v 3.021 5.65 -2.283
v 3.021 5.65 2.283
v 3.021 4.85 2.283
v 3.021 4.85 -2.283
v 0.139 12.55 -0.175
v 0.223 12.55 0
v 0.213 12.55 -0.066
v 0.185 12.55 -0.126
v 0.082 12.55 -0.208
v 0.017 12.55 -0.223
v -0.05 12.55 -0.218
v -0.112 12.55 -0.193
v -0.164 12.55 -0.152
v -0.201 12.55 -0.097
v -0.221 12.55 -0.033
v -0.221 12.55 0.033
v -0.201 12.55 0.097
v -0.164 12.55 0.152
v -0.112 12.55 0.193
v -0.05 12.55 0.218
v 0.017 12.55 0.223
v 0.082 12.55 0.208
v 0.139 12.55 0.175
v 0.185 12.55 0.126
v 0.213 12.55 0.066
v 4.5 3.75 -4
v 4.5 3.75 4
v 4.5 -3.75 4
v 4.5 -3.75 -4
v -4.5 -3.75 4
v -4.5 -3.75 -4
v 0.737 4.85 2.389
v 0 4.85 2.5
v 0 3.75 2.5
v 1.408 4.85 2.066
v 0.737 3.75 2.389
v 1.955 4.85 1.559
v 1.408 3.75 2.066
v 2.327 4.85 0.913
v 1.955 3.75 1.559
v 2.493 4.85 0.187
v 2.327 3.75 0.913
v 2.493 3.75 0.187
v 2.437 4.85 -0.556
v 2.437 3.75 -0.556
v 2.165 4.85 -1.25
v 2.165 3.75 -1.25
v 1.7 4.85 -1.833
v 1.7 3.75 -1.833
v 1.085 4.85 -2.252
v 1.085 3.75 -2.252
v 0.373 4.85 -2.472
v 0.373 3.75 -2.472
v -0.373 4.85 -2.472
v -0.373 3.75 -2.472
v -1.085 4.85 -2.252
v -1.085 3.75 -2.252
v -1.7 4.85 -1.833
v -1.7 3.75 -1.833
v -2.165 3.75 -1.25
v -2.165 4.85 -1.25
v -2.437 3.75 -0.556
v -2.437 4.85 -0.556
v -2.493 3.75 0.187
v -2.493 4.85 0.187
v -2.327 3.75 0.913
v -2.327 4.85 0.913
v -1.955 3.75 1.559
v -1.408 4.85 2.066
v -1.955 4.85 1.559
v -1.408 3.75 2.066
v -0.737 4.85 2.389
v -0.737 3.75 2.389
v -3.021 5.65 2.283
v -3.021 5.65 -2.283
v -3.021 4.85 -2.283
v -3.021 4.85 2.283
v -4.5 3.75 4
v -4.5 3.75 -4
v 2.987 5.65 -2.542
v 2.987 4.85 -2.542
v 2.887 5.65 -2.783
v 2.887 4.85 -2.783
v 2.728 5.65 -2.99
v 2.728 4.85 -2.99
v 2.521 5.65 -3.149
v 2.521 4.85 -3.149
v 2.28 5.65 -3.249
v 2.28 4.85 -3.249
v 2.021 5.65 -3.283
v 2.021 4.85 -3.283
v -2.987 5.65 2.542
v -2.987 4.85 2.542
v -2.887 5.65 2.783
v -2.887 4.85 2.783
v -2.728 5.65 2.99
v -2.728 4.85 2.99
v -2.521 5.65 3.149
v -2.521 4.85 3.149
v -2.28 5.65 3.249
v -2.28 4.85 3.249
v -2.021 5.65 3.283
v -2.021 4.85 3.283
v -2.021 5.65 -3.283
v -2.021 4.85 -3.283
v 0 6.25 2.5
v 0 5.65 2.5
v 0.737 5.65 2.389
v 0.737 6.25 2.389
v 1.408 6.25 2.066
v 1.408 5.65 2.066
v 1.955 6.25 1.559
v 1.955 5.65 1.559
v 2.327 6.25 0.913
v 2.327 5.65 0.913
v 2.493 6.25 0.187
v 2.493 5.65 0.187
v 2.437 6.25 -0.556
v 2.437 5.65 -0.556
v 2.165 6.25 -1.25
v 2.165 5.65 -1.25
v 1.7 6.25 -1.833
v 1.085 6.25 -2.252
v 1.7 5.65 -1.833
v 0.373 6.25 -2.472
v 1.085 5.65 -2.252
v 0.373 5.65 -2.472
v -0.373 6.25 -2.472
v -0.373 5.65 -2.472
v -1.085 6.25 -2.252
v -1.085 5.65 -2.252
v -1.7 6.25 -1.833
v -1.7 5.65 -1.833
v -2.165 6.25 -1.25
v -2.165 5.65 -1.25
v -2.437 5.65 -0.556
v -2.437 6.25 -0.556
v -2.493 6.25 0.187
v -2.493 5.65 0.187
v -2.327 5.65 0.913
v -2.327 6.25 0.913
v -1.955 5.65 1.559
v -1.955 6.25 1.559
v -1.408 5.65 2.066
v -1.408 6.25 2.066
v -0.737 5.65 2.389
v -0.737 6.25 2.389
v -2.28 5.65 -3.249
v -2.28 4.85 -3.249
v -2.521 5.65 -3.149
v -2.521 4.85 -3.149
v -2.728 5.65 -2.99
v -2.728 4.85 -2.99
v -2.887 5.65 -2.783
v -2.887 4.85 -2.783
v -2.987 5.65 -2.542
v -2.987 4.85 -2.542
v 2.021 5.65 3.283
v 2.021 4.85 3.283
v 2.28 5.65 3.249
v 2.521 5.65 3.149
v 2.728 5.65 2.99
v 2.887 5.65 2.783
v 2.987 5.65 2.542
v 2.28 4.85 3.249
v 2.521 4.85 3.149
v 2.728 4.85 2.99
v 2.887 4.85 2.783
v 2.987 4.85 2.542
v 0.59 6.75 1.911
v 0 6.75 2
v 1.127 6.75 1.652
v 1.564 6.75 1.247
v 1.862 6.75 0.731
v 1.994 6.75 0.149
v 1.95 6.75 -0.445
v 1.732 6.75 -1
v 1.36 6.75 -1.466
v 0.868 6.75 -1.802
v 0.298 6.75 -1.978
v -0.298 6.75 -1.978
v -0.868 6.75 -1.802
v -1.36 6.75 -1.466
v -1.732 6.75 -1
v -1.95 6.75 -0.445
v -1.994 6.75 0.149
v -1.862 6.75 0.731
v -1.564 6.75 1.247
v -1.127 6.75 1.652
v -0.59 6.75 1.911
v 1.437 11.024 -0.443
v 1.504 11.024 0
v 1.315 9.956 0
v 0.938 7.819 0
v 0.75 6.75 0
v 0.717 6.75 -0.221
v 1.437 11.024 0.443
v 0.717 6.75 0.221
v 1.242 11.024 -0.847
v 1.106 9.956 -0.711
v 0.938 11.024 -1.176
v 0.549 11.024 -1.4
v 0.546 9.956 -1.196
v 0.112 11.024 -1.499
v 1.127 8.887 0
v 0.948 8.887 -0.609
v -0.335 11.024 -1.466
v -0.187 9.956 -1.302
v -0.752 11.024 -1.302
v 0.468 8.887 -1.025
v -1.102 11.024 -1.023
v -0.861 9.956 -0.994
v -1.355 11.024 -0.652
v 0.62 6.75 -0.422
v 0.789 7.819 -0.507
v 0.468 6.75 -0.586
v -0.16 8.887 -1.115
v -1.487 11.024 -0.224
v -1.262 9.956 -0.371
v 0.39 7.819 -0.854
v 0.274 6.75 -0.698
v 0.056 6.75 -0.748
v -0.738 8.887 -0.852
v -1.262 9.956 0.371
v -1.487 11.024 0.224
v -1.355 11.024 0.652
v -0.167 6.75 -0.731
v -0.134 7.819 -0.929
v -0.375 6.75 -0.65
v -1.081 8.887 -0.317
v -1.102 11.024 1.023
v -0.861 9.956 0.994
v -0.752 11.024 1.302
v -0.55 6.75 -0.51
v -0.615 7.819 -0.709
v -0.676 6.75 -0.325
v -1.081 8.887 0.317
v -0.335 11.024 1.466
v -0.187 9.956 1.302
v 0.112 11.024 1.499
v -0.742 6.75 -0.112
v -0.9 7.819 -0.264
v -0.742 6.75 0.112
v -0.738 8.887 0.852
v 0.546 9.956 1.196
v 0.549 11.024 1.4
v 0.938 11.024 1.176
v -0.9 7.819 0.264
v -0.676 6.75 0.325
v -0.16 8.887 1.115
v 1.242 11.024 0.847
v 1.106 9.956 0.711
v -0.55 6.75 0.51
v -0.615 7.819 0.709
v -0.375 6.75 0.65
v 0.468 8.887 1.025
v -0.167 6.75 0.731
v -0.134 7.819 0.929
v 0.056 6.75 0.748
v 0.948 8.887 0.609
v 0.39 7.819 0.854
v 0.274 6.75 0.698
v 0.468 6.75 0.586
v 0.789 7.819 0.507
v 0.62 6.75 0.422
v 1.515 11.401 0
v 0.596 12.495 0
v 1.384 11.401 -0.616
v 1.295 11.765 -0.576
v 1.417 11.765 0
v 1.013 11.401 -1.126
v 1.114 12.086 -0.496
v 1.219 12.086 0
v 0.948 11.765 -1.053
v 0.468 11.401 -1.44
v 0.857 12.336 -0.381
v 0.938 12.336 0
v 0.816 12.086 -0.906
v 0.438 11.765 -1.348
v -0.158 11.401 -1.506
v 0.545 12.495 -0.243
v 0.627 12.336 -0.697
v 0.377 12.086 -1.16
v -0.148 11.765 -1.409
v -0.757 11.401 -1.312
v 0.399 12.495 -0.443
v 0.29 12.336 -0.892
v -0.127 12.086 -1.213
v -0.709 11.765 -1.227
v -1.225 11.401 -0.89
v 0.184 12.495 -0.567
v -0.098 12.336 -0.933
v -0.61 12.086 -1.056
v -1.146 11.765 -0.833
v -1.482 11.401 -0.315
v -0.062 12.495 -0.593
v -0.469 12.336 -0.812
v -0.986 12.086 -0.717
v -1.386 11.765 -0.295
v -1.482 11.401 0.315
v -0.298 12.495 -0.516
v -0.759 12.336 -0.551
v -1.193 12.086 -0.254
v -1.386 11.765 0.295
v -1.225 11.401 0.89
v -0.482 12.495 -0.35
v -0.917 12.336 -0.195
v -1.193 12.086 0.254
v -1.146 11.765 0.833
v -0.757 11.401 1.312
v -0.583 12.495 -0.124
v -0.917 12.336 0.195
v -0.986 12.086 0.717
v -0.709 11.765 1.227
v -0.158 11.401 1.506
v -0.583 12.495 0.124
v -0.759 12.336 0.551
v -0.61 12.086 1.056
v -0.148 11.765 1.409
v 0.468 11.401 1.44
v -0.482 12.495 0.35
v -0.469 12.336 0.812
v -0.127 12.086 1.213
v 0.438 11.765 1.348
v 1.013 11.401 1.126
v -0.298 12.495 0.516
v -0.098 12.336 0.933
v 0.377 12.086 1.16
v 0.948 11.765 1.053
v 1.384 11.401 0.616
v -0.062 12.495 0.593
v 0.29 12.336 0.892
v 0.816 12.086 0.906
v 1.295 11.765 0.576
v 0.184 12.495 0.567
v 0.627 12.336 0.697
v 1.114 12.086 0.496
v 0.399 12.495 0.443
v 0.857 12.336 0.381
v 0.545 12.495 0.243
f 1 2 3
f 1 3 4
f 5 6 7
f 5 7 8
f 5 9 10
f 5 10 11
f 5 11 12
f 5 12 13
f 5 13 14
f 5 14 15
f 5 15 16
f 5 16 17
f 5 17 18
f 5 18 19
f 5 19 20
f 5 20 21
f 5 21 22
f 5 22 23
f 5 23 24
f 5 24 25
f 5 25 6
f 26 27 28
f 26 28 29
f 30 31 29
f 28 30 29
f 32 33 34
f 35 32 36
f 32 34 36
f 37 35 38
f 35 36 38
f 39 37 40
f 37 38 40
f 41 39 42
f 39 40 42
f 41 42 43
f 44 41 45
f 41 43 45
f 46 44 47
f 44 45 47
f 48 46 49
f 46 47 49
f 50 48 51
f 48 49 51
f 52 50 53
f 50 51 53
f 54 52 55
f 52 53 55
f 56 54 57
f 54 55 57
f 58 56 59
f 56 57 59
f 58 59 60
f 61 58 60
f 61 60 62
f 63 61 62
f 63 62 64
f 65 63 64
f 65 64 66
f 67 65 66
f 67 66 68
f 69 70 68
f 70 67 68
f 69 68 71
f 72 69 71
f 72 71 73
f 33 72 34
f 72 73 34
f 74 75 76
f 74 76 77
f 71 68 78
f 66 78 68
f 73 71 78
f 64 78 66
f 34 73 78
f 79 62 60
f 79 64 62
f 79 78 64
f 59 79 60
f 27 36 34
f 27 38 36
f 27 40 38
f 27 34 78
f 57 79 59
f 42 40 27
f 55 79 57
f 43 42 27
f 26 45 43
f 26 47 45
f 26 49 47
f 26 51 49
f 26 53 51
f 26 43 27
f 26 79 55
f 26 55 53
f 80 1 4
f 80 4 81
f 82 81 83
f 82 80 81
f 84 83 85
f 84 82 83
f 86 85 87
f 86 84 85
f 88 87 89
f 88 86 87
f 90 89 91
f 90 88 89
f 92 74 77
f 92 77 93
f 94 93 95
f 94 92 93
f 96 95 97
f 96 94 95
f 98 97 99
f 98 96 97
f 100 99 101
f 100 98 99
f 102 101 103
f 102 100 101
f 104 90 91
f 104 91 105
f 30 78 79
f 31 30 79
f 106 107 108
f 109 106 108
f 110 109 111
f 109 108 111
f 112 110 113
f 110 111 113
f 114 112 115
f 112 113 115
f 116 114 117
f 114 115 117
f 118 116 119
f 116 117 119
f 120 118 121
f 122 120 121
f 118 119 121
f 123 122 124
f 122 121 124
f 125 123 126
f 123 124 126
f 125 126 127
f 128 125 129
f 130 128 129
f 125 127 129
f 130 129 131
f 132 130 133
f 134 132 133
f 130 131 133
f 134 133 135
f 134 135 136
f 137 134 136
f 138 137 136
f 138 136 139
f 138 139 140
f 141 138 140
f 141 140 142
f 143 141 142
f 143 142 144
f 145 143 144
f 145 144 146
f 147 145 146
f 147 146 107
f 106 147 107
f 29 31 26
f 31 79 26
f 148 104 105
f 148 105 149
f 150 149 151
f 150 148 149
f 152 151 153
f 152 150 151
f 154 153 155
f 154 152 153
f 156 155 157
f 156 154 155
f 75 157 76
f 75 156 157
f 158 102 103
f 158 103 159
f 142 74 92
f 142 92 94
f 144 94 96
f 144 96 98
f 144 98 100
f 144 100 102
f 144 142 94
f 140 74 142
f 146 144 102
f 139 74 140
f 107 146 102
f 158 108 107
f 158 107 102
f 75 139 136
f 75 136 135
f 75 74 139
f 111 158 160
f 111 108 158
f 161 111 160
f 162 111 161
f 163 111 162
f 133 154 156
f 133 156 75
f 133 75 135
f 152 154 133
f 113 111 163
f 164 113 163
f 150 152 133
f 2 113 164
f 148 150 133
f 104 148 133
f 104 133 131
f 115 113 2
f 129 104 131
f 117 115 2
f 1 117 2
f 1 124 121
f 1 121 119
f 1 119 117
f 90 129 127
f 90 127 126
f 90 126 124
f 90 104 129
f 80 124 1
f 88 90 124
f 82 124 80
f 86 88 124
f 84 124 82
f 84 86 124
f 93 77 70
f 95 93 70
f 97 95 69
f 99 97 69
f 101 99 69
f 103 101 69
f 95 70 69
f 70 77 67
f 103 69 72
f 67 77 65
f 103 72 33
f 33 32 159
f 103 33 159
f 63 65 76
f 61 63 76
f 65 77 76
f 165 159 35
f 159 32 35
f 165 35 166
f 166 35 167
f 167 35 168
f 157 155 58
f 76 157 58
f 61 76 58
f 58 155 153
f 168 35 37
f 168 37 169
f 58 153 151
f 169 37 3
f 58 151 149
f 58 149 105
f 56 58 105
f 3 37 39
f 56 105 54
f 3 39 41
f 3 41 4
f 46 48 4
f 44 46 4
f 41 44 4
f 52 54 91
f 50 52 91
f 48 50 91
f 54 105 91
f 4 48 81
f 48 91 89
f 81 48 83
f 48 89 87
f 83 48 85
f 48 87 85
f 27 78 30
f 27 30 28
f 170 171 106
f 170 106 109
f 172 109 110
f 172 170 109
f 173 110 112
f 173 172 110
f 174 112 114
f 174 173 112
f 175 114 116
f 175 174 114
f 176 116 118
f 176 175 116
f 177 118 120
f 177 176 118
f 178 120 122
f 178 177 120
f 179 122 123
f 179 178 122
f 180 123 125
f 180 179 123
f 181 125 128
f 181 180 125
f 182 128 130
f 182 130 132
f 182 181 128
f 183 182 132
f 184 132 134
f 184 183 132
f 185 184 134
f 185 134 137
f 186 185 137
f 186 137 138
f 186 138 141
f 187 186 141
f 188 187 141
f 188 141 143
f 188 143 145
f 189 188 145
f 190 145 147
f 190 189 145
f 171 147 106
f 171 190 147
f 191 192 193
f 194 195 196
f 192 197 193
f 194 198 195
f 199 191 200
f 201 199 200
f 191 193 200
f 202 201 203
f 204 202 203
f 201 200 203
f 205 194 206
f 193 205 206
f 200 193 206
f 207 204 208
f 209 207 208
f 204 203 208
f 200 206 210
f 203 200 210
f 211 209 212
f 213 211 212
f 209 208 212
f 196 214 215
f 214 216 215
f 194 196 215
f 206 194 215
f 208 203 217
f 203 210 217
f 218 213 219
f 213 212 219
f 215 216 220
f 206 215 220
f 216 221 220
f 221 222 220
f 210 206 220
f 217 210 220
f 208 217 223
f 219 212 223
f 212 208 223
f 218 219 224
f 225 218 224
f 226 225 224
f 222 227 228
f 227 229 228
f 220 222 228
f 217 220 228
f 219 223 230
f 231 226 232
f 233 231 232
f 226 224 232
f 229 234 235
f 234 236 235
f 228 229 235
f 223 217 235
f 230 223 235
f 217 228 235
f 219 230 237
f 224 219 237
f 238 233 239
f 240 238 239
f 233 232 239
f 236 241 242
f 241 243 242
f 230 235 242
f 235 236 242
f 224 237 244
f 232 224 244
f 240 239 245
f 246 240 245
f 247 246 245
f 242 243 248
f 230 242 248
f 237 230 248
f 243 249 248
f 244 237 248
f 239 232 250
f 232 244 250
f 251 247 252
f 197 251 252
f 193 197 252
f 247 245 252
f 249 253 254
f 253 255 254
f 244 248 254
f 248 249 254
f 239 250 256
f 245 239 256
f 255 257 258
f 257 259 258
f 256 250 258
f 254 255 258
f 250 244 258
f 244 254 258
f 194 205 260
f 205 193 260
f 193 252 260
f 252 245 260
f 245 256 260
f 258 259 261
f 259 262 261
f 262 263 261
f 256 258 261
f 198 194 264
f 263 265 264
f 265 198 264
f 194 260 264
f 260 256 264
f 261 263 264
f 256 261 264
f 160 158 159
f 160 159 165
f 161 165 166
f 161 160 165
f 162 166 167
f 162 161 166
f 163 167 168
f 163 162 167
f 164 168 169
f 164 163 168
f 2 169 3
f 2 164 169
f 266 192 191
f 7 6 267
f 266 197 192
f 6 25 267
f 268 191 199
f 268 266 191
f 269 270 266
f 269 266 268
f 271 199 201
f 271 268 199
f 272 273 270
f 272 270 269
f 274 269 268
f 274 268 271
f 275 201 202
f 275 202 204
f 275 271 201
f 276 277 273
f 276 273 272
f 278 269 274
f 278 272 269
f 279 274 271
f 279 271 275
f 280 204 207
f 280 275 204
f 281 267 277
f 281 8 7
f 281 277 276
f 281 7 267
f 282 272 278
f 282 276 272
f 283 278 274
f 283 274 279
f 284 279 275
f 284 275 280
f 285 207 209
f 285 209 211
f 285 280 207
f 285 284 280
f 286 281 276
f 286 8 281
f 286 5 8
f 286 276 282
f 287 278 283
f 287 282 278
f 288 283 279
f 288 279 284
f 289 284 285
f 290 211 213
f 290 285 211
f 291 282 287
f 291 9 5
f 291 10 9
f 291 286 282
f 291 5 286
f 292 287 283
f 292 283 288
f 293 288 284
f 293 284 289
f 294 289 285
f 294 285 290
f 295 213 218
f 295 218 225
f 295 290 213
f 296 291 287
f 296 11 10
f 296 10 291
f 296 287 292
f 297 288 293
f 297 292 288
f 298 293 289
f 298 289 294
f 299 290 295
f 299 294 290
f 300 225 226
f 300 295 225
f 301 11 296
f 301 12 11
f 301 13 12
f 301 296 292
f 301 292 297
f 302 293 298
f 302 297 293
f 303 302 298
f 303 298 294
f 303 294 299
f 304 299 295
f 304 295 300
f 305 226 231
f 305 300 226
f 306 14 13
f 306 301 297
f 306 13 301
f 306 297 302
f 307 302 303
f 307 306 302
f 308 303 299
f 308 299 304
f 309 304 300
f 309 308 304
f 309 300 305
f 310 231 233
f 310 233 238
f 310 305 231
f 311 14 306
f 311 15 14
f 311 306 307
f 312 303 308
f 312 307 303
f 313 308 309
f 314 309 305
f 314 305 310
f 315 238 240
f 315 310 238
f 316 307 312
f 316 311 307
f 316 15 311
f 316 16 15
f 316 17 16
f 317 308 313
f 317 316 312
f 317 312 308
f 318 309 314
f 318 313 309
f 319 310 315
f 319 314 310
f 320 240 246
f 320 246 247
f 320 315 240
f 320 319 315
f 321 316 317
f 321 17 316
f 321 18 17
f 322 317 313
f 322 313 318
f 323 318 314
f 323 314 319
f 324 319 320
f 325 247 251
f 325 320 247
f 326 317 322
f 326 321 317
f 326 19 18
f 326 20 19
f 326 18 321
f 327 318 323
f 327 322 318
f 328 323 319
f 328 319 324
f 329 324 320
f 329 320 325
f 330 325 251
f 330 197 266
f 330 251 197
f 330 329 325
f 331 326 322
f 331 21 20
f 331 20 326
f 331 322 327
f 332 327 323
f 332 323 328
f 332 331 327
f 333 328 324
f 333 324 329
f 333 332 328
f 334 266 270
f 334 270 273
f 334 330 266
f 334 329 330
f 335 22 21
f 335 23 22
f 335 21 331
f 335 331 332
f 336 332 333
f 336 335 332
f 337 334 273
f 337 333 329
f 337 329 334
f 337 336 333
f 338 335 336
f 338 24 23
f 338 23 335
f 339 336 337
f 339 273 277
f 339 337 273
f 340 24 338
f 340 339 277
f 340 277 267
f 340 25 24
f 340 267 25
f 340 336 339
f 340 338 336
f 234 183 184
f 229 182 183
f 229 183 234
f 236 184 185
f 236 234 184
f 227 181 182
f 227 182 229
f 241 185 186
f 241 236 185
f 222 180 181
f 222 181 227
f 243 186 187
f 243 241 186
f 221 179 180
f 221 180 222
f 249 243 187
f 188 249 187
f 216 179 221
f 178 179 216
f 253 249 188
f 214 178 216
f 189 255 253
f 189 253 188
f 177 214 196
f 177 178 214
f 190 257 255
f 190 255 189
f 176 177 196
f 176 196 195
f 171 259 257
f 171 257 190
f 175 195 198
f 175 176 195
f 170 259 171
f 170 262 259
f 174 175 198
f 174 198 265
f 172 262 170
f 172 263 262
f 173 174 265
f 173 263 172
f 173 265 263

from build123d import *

# Parameters (mm, degrees)
SKETCH_1_W      = 9
SKETCH_1_H      = 8
EXTRUDE_1_DEPTH = 3.75
SKETCH_2_R      = 2.5
EXTRUDE_2_DEPTH = 3
CHAMFER_1_SIZE  = 0.5
EXTRUDE_3_DEPTH = 0.8
SKETCH_4_R      = 0.75
EXTRUDE_4_DEPTH = 5.8
EXTRUDE_4_DRAFT = -10
FILLET_1_R      = 1.3


with BuildPart() as part:
    # Эскиз1 → Бобышка-Вытянуть1 (new, symmetric)
    with BuildSketch(Plane(origin=(0, 0, 0), x_dir=(1, 0, 0), z_dir=(0, 1, 0))):
        Rectangle(SKETCH_1_W, SKETCH_1_H)
    extrude(amount=EXTRUDE_1_DEPTH, both=True)

    # Эскиз2 → Бобышка-Вытянуть2 (add)
    with BuildSketch(Plane(origin=(0, 3.75, 0), x_dir=(1, 0, 0), z_dir=(0, 1, 0))):
        with Locations(Location((0, 0, 0), (0, 0, 270))):
            Circle(SKETCH_2_R)
    extrude(amount=EXTRUDE_2_DEPTH)

    # Фаска1
    chamfer_1_edges = [part.edges().sort_by_distance(p)[0] for p in [
        (0, 6.75, -2.5),
    ]]
    chamfer(chamfer_1_edges, length=CHAMFER_1_SIZE)

    # Эскиз3 → Бобышка-Вытянуть3 (add)
    with BuildSketch(Plane(origin=(0, 5.65, 0), x_dir=(1, 0, 0), z_dir=(0, 1, 0))):
        with BuildLine():
            Line((-2.020987717, -3.283260181), (2.020987717, -3.283260181))
            ThreePointArc((2.020987717, -3.283260181), (2.728094498, -2.990366962), (3.020987717, -2.283260181))
            Line((3.020987717, -2.283260181), (3.020987717, 2.283260181))
            ThreePointArc((3.020987717, 2.283260181), (2.728094498, 2.990366962), (2.020987717, 3.283260181))
            Line((2.020987717, 3.283260181), (-2.020987717, 3.283260181))
            ThreePointArc((-2.020987717, 3.283260181), (-2.728094498, 2.990366962), (-3.020987717, 2.283260181))
            Line((-3.020987717, 2.283260181), (-3.020987717, -2.283260181))
            ThreePointArc((-3.020987717, -2.283260181), (-2.728094498, -2.990366962), (-2.020987717, -3.283260181))
        make_face()
    extrude(amount=-EXTRUDE_3_DEPTH)


with BuildPart() as extrude_4_tool:
    # Эскиз4 → Бобышка-Вытянуть4 (with draft: the straight prism first)
    with BuildSketch(Plane(origin=(0, 6.75, 0), x_dir=(1, 0, 0), z_dir=(0, 1, 0))):
        Circle(SKETCH_4_R)
    extrude(amount=EXTRUDE_4_DEPTH)
    # Бобышка-Вытянуть4: the draft: its side faces are tilted about the plane it starts from
    extrude_4_sides = [extrude_4_tool.faces().sort_by_distance(p)[0] for p in [
        (-0.75, 9.65, 0),
    ]]
    draft(extrude_4_sides, Plane(origin=(0, 6.75, 0), x_dir=(1, 0, 0), z_dir=(0, 1, 0)), EXTRUDE_4_DRAFT)


with BuildPart() as part_1:
    add(part.part)

    # Бобышка-Вытянуть4: add extrude_4_tool
    add(extrude_4_tool.part)

    # Скругление1
    fillet_1_edges = [part_1.edges().sort_by_distance(p)[0] for p in [
        (-1.772696488, 12.55, 0),
    ]]
    fillet(fillet_1_edges, radius=FILLET_1_R)


solid = part_1.part
